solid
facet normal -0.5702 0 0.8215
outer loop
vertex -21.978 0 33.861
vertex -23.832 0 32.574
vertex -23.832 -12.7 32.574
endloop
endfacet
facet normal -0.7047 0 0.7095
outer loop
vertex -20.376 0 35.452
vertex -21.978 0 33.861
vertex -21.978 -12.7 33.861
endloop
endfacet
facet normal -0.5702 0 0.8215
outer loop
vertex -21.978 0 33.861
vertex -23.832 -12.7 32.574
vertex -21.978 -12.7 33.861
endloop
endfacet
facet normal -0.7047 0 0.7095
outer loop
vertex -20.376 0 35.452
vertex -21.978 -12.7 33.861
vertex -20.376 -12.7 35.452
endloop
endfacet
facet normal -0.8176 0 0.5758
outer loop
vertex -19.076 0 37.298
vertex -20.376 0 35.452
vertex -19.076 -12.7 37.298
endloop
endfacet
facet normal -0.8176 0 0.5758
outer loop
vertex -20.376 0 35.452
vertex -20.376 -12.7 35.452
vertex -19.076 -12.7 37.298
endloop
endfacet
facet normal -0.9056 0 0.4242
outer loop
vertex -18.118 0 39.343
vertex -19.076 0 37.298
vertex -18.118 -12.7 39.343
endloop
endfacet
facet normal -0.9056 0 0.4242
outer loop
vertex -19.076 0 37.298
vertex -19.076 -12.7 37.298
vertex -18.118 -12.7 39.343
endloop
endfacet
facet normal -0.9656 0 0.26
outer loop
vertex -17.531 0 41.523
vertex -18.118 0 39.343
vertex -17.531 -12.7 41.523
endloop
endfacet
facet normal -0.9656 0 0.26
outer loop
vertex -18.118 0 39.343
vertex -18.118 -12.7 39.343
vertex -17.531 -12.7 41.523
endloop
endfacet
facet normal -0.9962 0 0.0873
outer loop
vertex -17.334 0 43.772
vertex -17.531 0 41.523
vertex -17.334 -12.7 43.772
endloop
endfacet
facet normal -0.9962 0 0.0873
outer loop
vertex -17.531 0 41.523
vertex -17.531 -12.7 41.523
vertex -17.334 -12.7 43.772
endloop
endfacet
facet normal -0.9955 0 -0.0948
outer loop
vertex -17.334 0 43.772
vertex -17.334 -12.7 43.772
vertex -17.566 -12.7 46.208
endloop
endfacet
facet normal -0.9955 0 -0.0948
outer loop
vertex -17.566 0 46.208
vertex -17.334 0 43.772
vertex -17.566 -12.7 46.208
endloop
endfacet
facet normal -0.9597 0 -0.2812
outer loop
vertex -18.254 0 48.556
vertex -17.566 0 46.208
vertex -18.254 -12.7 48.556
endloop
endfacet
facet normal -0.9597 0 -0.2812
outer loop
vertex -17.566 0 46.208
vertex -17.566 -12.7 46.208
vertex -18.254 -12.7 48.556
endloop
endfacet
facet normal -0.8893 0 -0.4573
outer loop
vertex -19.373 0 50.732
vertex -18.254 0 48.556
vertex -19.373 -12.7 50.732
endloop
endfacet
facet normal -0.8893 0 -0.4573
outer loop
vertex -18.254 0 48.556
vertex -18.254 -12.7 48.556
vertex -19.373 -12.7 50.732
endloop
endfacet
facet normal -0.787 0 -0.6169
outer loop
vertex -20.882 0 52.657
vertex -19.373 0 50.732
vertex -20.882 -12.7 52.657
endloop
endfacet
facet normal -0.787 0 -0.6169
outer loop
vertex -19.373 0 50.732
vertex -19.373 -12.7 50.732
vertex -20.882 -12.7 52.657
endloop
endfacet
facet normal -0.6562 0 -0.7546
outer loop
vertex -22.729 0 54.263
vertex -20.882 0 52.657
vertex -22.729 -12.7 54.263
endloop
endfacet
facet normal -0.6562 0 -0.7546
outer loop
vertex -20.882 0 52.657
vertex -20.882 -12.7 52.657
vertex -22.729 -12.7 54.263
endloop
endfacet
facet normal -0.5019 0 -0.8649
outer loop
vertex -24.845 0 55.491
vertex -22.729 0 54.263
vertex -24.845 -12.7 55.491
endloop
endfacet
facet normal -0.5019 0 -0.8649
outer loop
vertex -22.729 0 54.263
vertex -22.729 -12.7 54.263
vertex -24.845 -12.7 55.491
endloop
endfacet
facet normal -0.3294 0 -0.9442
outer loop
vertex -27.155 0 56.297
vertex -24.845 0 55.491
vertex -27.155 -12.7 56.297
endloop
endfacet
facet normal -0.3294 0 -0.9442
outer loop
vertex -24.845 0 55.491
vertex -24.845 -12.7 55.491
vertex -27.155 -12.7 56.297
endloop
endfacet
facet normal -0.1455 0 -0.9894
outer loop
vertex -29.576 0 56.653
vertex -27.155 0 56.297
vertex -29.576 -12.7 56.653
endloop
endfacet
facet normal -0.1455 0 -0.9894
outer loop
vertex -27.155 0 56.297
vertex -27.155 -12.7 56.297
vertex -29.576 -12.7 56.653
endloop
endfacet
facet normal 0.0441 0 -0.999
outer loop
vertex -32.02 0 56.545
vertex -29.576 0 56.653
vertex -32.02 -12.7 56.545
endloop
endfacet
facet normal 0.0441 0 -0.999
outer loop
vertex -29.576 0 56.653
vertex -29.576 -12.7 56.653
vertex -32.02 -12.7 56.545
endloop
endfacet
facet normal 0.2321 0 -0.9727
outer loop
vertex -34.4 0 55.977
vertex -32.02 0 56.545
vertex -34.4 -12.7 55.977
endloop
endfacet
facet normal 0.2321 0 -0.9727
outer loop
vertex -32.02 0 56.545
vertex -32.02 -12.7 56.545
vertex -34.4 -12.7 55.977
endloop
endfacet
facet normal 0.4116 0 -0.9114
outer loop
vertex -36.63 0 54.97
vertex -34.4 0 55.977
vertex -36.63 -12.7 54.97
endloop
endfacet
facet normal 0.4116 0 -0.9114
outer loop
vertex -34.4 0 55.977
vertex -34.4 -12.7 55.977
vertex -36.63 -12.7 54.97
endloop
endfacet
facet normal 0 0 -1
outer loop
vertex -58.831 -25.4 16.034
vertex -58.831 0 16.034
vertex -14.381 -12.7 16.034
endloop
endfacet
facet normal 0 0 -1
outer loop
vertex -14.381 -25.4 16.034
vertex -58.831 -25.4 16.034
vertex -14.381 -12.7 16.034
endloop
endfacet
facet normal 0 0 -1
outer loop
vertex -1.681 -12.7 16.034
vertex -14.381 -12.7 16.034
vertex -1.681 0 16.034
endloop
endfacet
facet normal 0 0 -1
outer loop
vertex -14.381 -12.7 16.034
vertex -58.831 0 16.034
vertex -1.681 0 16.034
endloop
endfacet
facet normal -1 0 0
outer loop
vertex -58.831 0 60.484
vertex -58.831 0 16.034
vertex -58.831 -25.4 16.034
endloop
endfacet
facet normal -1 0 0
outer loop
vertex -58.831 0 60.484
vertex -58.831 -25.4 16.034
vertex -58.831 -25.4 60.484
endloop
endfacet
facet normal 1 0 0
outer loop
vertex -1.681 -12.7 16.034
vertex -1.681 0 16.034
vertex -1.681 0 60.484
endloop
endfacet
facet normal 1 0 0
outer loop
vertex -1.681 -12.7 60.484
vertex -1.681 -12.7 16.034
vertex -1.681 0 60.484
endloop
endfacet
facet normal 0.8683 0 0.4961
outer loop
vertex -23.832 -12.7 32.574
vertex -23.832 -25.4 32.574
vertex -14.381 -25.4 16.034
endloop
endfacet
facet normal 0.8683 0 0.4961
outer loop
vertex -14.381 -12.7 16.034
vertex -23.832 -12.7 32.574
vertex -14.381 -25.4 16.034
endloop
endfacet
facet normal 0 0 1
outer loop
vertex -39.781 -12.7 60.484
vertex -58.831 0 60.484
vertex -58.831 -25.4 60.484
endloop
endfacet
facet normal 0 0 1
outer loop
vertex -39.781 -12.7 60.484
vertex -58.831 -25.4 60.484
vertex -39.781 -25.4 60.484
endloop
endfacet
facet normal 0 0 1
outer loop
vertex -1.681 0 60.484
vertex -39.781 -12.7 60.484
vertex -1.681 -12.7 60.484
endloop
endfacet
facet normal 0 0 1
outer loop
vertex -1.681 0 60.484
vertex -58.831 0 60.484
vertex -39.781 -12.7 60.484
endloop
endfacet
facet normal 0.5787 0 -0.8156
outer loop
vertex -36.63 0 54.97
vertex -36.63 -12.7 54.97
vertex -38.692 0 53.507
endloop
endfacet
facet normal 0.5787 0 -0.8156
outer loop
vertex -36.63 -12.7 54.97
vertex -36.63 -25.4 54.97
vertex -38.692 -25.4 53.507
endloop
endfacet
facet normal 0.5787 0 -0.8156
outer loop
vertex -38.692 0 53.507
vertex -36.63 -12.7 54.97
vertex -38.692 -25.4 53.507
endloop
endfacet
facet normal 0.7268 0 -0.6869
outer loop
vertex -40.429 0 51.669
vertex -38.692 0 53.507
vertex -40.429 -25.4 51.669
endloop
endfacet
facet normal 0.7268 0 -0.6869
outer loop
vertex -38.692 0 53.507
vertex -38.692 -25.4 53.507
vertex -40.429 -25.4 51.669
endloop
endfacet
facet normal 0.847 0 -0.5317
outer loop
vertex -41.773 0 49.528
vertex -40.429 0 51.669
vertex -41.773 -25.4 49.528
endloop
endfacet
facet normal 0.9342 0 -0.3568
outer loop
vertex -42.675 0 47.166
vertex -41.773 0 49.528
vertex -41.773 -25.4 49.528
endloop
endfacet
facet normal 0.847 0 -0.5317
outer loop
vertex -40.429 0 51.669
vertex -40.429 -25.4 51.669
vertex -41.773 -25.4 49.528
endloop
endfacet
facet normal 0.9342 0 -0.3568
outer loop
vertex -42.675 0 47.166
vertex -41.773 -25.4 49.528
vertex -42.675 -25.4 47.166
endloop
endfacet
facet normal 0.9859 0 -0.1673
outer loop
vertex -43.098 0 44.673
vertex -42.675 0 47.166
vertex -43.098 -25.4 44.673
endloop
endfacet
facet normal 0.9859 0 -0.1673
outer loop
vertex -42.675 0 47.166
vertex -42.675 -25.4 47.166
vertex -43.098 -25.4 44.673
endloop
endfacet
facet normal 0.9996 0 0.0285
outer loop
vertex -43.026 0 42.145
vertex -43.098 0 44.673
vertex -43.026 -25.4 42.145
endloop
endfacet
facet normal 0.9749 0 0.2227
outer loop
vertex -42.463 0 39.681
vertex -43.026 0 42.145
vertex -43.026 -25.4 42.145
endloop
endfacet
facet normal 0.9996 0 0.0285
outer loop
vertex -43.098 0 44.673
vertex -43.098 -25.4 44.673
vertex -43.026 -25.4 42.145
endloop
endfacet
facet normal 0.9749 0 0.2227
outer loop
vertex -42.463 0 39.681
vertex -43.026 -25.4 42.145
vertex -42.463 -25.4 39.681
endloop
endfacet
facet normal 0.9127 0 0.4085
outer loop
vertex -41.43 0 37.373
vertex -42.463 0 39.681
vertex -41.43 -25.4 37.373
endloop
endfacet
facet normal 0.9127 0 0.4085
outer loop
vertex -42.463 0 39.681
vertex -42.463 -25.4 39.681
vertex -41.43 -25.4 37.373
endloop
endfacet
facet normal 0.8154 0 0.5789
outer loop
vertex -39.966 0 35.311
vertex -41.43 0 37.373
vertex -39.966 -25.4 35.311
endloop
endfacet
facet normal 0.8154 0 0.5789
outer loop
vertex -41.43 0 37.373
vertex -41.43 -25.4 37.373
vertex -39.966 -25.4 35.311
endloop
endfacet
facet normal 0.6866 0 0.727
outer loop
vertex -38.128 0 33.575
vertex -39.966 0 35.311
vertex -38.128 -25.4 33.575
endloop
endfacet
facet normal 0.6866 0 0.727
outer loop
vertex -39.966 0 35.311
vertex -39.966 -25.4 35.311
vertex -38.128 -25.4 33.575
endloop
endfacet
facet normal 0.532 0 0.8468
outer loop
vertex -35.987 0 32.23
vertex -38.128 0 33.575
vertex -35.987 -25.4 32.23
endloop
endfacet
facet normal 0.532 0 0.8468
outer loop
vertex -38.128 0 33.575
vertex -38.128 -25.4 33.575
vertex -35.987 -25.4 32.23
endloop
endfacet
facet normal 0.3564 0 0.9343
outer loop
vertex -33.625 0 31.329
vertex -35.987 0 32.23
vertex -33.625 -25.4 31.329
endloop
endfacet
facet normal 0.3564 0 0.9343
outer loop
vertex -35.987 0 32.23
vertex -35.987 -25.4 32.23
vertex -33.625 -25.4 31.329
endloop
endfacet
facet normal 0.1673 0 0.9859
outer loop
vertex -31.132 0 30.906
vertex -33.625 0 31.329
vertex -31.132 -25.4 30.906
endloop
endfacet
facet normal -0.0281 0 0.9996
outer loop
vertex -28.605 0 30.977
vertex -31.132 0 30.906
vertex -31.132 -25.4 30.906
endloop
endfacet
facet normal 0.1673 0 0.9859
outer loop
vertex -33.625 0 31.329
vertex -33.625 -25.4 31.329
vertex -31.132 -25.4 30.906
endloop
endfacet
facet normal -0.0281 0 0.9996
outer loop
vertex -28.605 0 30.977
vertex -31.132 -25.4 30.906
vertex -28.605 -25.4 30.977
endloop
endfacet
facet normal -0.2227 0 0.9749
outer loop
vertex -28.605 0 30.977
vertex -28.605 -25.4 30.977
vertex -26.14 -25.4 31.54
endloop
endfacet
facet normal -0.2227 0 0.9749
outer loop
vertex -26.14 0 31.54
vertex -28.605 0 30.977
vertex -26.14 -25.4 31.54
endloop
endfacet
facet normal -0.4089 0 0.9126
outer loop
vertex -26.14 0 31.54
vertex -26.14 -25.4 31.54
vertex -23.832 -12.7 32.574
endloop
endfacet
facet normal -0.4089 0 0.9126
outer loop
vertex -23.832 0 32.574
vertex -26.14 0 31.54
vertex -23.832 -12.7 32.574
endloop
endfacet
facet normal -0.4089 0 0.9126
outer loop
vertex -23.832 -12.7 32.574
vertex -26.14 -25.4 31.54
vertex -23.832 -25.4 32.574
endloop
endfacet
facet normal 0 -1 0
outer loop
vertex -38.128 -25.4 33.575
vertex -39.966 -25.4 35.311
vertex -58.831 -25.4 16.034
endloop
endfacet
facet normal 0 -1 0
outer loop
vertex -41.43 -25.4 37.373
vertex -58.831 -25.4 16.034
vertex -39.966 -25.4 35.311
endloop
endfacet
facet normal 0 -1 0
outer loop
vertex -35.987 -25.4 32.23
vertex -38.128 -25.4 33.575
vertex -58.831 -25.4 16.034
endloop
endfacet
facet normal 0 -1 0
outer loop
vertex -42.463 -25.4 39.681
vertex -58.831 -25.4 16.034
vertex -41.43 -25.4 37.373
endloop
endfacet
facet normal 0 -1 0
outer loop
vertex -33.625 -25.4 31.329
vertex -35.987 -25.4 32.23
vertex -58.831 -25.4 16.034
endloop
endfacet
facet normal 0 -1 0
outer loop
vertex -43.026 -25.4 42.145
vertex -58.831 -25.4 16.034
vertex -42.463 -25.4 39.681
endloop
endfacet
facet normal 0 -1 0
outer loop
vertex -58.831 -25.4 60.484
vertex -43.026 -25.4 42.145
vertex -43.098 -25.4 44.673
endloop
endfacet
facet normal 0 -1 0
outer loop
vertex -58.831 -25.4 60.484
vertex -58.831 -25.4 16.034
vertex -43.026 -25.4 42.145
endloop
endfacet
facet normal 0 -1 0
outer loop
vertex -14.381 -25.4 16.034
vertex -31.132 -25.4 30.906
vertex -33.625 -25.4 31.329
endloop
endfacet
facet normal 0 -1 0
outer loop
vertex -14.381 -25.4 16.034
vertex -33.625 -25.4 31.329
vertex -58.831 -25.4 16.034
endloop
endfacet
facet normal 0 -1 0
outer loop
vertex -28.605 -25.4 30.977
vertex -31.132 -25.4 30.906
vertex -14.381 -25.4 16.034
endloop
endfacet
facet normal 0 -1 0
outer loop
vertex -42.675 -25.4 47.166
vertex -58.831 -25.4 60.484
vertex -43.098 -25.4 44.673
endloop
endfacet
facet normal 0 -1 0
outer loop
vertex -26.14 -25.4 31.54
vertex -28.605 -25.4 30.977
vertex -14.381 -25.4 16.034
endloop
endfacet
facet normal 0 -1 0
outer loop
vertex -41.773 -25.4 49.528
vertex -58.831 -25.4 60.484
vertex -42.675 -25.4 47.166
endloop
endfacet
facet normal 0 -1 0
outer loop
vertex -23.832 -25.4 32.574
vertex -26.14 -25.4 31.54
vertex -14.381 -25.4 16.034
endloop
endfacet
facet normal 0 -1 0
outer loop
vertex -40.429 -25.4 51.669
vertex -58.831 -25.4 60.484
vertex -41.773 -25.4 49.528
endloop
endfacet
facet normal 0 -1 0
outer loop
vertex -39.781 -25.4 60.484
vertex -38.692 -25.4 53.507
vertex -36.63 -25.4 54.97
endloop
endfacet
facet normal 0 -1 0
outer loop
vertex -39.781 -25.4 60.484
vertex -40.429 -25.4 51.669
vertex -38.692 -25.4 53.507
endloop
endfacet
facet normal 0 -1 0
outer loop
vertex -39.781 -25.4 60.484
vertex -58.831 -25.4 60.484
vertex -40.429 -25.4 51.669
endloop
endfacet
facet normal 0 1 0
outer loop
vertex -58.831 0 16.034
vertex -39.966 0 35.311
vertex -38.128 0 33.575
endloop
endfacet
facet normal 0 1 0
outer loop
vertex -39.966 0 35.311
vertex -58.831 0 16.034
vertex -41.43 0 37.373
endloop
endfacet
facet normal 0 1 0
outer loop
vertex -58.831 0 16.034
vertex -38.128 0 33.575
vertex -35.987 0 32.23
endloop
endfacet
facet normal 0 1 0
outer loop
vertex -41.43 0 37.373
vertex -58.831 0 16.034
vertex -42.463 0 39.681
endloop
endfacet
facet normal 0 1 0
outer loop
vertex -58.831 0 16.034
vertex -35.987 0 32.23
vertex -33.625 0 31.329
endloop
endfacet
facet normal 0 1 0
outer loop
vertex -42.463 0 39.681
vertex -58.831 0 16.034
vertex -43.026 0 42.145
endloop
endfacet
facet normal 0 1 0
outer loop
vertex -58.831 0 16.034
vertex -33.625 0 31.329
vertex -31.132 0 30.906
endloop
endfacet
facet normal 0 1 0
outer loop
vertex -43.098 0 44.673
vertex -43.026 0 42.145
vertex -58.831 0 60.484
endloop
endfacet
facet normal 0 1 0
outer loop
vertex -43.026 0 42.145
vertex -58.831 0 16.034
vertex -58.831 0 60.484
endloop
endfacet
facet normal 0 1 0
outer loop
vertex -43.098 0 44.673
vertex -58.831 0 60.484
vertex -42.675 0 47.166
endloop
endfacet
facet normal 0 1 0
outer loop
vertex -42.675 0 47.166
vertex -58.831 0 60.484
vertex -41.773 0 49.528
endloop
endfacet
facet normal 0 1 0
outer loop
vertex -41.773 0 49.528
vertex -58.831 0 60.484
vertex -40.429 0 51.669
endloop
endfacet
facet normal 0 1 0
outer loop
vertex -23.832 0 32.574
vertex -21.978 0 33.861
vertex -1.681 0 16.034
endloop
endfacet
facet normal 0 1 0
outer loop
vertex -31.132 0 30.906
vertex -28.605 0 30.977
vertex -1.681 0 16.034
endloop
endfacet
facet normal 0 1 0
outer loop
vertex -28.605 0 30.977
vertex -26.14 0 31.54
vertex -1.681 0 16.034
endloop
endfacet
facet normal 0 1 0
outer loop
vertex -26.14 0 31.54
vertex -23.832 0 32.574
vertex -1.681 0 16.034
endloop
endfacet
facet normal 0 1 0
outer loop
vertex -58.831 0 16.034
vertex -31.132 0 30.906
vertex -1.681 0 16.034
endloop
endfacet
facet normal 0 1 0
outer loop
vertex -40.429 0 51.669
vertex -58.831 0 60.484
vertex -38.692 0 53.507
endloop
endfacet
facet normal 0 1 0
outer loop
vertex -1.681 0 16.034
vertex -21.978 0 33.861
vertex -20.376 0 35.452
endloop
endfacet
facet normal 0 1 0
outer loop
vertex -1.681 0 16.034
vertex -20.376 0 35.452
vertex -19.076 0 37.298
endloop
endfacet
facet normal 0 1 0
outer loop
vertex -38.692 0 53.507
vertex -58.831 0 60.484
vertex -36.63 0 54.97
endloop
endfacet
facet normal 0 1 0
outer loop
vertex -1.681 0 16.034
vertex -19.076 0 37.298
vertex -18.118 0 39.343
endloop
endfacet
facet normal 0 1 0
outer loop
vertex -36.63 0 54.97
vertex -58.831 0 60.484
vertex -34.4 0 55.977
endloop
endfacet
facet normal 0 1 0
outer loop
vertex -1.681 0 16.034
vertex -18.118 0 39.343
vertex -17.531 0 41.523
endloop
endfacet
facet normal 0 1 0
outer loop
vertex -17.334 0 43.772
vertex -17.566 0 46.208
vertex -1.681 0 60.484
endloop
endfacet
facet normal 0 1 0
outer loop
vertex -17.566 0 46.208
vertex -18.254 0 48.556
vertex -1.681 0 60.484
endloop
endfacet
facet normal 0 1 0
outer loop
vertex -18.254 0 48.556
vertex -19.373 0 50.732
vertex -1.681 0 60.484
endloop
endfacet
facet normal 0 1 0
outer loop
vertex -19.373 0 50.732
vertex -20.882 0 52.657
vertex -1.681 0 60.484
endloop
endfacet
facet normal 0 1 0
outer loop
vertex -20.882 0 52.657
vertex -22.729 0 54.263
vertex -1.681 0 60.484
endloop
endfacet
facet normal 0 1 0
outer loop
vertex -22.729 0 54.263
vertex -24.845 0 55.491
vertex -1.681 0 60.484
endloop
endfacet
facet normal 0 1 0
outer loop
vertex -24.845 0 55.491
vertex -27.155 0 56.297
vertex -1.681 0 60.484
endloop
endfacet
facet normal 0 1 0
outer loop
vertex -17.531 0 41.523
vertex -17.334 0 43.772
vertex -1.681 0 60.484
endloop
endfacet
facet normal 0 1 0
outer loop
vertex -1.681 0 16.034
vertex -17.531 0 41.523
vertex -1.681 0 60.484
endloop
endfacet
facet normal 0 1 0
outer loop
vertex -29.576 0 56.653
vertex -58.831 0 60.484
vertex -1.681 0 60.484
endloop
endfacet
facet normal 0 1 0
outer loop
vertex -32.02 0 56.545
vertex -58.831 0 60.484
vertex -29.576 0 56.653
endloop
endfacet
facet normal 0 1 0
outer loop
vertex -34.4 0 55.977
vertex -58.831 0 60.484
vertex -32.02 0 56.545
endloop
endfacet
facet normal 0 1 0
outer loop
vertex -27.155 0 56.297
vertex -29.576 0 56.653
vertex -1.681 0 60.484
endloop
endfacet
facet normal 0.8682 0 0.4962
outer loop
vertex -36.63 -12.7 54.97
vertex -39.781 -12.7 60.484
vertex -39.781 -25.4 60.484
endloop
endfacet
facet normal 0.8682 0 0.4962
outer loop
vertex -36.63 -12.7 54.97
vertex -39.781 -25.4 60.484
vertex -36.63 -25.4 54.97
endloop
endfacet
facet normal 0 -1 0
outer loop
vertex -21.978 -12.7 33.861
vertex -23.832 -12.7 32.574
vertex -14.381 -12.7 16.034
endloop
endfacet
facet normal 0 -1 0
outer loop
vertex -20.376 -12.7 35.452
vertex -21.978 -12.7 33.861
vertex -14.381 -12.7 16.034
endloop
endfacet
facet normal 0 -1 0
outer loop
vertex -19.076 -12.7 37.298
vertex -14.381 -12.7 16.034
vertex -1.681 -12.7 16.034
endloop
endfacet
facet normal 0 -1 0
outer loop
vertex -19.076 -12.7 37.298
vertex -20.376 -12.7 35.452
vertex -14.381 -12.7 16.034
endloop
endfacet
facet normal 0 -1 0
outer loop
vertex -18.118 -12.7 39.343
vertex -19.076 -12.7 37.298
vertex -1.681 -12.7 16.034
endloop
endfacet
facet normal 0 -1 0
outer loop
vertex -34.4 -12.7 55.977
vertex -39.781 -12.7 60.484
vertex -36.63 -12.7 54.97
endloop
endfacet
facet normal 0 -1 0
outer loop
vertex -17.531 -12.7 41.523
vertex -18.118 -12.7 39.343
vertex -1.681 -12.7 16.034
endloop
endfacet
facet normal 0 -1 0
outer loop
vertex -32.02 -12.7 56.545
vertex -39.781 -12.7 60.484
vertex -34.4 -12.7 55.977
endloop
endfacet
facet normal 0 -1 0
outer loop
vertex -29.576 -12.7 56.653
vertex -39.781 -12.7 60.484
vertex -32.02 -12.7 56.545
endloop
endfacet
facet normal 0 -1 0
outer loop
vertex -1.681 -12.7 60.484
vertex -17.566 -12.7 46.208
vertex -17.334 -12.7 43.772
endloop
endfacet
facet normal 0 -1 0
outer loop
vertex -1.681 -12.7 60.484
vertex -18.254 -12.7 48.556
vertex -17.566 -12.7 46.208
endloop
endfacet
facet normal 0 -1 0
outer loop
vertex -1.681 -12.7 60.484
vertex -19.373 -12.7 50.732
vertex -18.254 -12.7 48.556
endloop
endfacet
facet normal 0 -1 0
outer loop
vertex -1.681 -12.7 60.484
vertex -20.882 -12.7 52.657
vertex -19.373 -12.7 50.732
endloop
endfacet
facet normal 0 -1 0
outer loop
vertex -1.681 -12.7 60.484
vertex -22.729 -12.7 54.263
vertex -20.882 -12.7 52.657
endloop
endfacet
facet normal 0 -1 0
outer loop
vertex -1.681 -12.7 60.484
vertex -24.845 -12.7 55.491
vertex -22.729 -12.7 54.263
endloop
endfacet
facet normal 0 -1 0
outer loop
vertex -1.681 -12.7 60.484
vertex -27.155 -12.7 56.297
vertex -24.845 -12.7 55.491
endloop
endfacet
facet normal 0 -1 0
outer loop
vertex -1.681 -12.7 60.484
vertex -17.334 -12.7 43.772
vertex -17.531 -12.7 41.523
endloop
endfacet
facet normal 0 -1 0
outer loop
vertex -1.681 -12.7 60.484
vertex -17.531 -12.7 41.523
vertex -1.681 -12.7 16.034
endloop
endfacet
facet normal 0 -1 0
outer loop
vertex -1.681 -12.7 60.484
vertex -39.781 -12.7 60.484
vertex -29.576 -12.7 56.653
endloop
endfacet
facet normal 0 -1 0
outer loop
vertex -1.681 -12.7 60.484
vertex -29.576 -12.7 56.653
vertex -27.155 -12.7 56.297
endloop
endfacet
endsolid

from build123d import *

# Parameters (mm, degrees)
F0_W     = 57.15
F0_H     = 44.45
F1_DEPTH = 25.4
F3_DEPTH = 12.7
F4_DEPTH = 25.4


with BuildPart() as f1:
    # F0 (on Front) → F1 (new body)
    with BuildSketch(Plane.XZ):
        with Locations((-30.2558824187, 38.2586528428)):
            Rectangle(F0_W, F0_H)
    extrude(amount=F1_DEPTH)

    # F2 (on face) → F3 (cut)
    with BuildSketch(Plane.XZ.offset(25.4)):
        with BuildLine():
            ThreePointArc((-17.3336963264, 43.7719967953), (-23.7576790398, 54.9273203296), (-36.6304001601, 54.9703088903))
            Line((-36.6304001601, 54.9703088903), (-23.8323291944, 32.5736847003))
            ThreePointArc((-23.8323291944, 32.5736847003), (-19.0760411429, 37.2983111579), (-17.3336963264, 43.7719967953))
        make_face()
        with BuildLine():
            Line((-23.8323291944, 32.5736847003), (-36.6304001601, 54.9703088903))
            ThreePointArc((-36.6304001601, 54.9703088903), (-41.4296767723, 37.3729613124), (-23.8323291944, 32.5736847003))
        make_face()
        with BuildLine():
            Line((-1.6808824187, 60.4836528428), (-39.7808824187, 60.4836528428))
            Line((-39.7808824187, 60.4836528428), (-36.6304001601, 54.9703088903))
            ThreePointArc((-36.6304001601, 54.9703088903), (-23.7576790398, 54.9273203296), (-17.3336963264, 43.7719967953))
            ThreePointArc((-17.3336963264, 43.7719967953), (-19.0760411429, 37.2983111579), (-23.8323291944, 32.5736847003))
            Line((-23.8323291944, 32.5736847003), (-14.3808824187, 16.0336528428))
            Line((-14.3808824187, 16.0336528428), (-1.6808824187, 16.0336528428))
            Line((-1.6808824187, 16.0336528428), (-1.6808824187, 60.4836528428))
        make_face()
    extrude(amount=-F3_DEPTH, mode=Mode.SUBTRACT)

    # F2 (on face) → F4 (cut)
    with BuildSketch(Plane.XZ.offset(25.4)):
        with BuildLine():
            ThreePointArc((-17.3336963264, 43.7719967953), (-23.7576790398, 54.9273203296), (-36.6304001601, 54.9703088903))
            Line((-36.6304001601, 54.9703088903), (-23.8323291944, 32.5736847003))
            ThreePointArc((-23.8323291944, 32.5736847003), (-19.0760411429, 37.2983111579), (-17.3336963264, 43.7719967953))
        make_face()
        with BuildLine():
            Line((-23.8323291944, 32.5736847003), (-36.6304001601, 54.9703088903))
            ThreePointArc((-36.6304001601, 54.9703088903), (-41.4296767723, 37.3729613124), (-23.8323291944, 32.5736847003))
        make_face()
    extrude(amount=-F4_DEPTH, mode=Mode.SUBTRACT)


solid = f1.part
